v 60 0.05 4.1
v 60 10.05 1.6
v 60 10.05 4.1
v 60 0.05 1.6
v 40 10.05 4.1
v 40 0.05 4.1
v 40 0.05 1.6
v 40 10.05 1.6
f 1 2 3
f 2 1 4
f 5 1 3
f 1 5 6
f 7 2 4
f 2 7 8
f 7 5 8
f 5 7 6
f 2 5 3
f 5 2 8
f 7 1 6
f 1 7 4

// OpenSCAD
    // MixTape 3d Printed Case///////////////////////////

plugHeight = 11; // [6:10]
tapeHeight = 10.5; //
topThickness = 1.6; 

usb_charger = false;
cutout_aux_ports = false;

//PCB();
//parts();

difference(){
    
    FullCase();
    
    // Plugs 
    translate([2.5,50,tapeHeight-plugHeight+topThickness]) cube([13,20,plugHeight+1],false); 
    translate([83.5,50,tapeHeight-plugHeight+topThickness]) cube([13,20,plugHeight+1],false);
    
    // write protectors 
    translate([10,0,0.5*tapeHeight+1.6]) cube([4,1,4],true);
    translate([14,0,0.5*tapeHeight+1.6]) cube([4,3,4],true);
    translate([89,0,0.5*tapeHeight+1.6]) cube([4,1,4],true);
    translate([85,0,0.5*tapeHeight+1.6]) cube([4,3,4],true);

    // Power signs
    if (!usb_charger) {
        translate([41,0,0.5*tapeHeight+1.6]) cube([4,1.5,1],true);
        translate([41,0,0.5*tapeHeight+1.6]) cube([1,1.5,4],true);
    
        translate([58,0,0.5*tapeHeight+1.6]) cube([4,1.5,1],true); 
    }
}


module FullCase(){
    tapeBody();
    tapeTop();
}

// Modules ///////////////////////////////

module PCB(){
 color("DarkKhaki") 
    translate ([0,0,tapeHeight+1.6]) linear_extrude(height = 1.6, center = false, convexity = 10, twist = 0) import("mixtape_case_3D_bottom.dxf", convexity=3);
 color("Gold") 
     translate ([0,0,tapeHeight+3.2]) linear_extrude(height = 0.2, center = false, convexity = 10, twist = 0) import("mixtape_case_3D_PCB.dxf", convexity=3);
    
 color("DarkKhaki") 
    translate ([0,0,tapeHeight+2*topThickness]) linear_extrude(height = 1.6, center = false, convexity = 10, twist = 0) import("mixtape_case_3D_PCB_TrapezBoard.dxf", convexity=3);
 color("Gold") 
     translate ([0,0,tapeHeight+3*topThickness]) linear_extrude(height = 0.2, center = false, convexity = 10, twist = 0) import("mixtape_case_3D_PCB_TrapezCircuit.dxf", convexity=3);
}

module tapeBody(){ 
  difference(){ 
    //color("Deeppink") 
    translate ([0,0,1.6]) linear_extrude(height = tapeHeight, center = false, convexity = 10, twist = 0) import("mixtape_case_3D_bottom.dxf", convexity=3);  
    
     if (!usb_charger) {
        translate ([0,0,0.6]) linear_extrude(height = 12, center = false, convexity = 10, twist = 0) import("mixtape_case_3D_MainCase.dxf", convexity=3);
     } else {
         translate ([0,0,0.6]) linear_extrude(height = 12, center = false, convexity = 10, twist = 0) import("mixtape_case_3D_MainCase_USB.dxf", convexity=3);
     }
    
    //Face holes
    translate([25,64,0.5*tapeHeight+topThickness]) cube([12,4,0.7*tapeHeight],true);
    if (!usb_charger) { translate([49.5,64,0.5*tapeHeight+topThickness]) cube([16,4,0.7*tapeHeight],true); }
    translate([74.3,64,0.5*tapeHeight+topThickness]) cube([12,4,0.7*tapeHeight],true);
      
    translate([36,65,0.5*tapeHeight+topThickness]) cube([4,4,0.6*tapeHeight],true);
    translate([63,65,0.5*tapeHeight+topThickness]) cube([4,4,0.6*tapeHeight],true);
    
    if (usb_charger) {
        // cutout usb port
        translate([49.5,64,0.5*tapeHeight+topThickness+3]) cube([20,14,0.7*tapeHeight+4],true);
    }
    if (cutout_aux_ports) {
        translate([1.5,23,0.5*tapeHeight+topThickness+3]) cube([20,12,0.7*tapeHeight],true);
        translate([90,23,0.5*tapeHeight+topThickness+3]) cube([20,12,0.7*tapeHeight],true);      
    }
     
  }
  
  
  //color("DarkKhaki") 
  if (!usb_charger) {
    translate([40,0.05,1.6]) cube([20,10,2.5],false);
  }
}

module tapeTop(){ 
 
difference(){ 
 color("Deeppink") 
     translate ([0,0,-1.5]) linear_extrude(height = 1.5, center = false, convexity = 10, twist = 0) import("mixtape_case_3D_TopTrapez.dxf", convexity=3);
     
   color("Gold") 
     translate ([0,0,-2.2]) linear_extrude(height = 3, center = false, convexity = 10, twist = 0) import("mixtape_case_3D_Holes.dxf", convexity=3);
   translate([50,53,-2.2]) cylinder(h=1.2, r=1.3, center=false, ,$fn=30);
}   
    

difference(){    
  color("Deeppink") 
     translate ([0,0,0]) linear_extrude(height = 1.6, center = false, convexity = 10, twist = 0) import("mixtape_case_3D_bottom.dxf", convexity=3);

  translate([4,3,-1]) cylinder(h=1.5, r=1.3, center=false, ,$fn=30);
  translate([95,3,-1]) cylinder(h=1.5, r=1.3, center=false, ,$fn=30);
  translate([4,61,-1]) cylinder(h=1.5, r=1.3, center=false, ,$fn=30);
  translate([95,61,-1]) cylinder(h=1.5, r=1.3, center=false, ,$fn=30);
    
  color("Pink") 
     translate ([0,0,-1.3]) linear_extrude(height = 2, center = false, convexity = 10, twist = 0) import("mixtape_case_3D_WindowRect.dxf", convexity=3); 
    
  difference(){    
  color("Gold") 
     translate ([0,0,-0.5]) linear_extrude(height = 1, center = false, convexity = 10, twist = 0) import("mixtape_case_3D_BigRect.dxf", convexity=3);  
  

  translate ([0,0,-3]) linear_extrude(height = 10, center = false, convexity = 10, twist = 0) import("mixtape_case_3D_MidRect.dxf", convexity=3);   
  }
  
  translate ([0,0,-3]) linear_extrude(height = 5.5, center = false, convexity = 10, twist = 0) import("mixtape_case_3D_Wheels.dxf", convexity=3); 
}

  translate ([0,0,0.8]) linear_extrude(height = 0.8, center = false, convexity = 10, twist = 0) import("mixtape_case_3D_NutWheels.dxf", convexity=3); 

}
 

module parts(){
    // IC-Socket
  color("Grey")
      translate([44,22.5,tapeHeight+2*topThickness]) cube([11,13,4],false);
    
  difference(){
  color("Black")
      translate([45,23.5,tapeHeight+2*topThickness]) cube([9,11,7],false);
        
    translate([49.5,34.5,tapeHeight+2*topThickness+6]) cylinder(h=10, r=1.5, center=false, ,$fn=30);
    }
    
    // NEO-Pixels
    for (a = [ 0 : 6.3 : 46 ])
    translate([a,0,0]) NEOpixel();
    
    module NEOpixel(){
    color("White")
      translate([25.2,52.5,tapeHeight+3*topThickness]) cube([5,5,2],false);
        
    color("Deeppink")
      translate([27.7,55,tapeHeight+3*topThickness]) cylinder(h=2.5, r=2, center=false, ,$fn=30);
    }
    
    // Pots
    potentiometer();
    translate ([42,0,0]) potentiometer();
    
    module potentiometer(){
    color("Grey")
      translate([29,29,tapeHeight+2*topThickness]) cylinder(h=10, r=3.5, center=false, ,$fn=30);
    
    color("Deeppink")
        translate([29,29,tapeHeight+2*topThickness+2]) cylinder(h=12, r1=6, r2=4.5, center=false, ,$fn=30);
    }
    
    // Buttons
    button();
    translate ([58,0,0]) button();
    
    module button(){
    color("Grey")
      translate([17.5,9.8,tapeHeight+2*topThickness]) cube([6,6,3],false);
        
    color("Red")
      translate([20.5,12.8,tapeHeight+2*topThickness]) cylinder(h=5, r=1.5, center=false, ,$fn=30);
    }

}
